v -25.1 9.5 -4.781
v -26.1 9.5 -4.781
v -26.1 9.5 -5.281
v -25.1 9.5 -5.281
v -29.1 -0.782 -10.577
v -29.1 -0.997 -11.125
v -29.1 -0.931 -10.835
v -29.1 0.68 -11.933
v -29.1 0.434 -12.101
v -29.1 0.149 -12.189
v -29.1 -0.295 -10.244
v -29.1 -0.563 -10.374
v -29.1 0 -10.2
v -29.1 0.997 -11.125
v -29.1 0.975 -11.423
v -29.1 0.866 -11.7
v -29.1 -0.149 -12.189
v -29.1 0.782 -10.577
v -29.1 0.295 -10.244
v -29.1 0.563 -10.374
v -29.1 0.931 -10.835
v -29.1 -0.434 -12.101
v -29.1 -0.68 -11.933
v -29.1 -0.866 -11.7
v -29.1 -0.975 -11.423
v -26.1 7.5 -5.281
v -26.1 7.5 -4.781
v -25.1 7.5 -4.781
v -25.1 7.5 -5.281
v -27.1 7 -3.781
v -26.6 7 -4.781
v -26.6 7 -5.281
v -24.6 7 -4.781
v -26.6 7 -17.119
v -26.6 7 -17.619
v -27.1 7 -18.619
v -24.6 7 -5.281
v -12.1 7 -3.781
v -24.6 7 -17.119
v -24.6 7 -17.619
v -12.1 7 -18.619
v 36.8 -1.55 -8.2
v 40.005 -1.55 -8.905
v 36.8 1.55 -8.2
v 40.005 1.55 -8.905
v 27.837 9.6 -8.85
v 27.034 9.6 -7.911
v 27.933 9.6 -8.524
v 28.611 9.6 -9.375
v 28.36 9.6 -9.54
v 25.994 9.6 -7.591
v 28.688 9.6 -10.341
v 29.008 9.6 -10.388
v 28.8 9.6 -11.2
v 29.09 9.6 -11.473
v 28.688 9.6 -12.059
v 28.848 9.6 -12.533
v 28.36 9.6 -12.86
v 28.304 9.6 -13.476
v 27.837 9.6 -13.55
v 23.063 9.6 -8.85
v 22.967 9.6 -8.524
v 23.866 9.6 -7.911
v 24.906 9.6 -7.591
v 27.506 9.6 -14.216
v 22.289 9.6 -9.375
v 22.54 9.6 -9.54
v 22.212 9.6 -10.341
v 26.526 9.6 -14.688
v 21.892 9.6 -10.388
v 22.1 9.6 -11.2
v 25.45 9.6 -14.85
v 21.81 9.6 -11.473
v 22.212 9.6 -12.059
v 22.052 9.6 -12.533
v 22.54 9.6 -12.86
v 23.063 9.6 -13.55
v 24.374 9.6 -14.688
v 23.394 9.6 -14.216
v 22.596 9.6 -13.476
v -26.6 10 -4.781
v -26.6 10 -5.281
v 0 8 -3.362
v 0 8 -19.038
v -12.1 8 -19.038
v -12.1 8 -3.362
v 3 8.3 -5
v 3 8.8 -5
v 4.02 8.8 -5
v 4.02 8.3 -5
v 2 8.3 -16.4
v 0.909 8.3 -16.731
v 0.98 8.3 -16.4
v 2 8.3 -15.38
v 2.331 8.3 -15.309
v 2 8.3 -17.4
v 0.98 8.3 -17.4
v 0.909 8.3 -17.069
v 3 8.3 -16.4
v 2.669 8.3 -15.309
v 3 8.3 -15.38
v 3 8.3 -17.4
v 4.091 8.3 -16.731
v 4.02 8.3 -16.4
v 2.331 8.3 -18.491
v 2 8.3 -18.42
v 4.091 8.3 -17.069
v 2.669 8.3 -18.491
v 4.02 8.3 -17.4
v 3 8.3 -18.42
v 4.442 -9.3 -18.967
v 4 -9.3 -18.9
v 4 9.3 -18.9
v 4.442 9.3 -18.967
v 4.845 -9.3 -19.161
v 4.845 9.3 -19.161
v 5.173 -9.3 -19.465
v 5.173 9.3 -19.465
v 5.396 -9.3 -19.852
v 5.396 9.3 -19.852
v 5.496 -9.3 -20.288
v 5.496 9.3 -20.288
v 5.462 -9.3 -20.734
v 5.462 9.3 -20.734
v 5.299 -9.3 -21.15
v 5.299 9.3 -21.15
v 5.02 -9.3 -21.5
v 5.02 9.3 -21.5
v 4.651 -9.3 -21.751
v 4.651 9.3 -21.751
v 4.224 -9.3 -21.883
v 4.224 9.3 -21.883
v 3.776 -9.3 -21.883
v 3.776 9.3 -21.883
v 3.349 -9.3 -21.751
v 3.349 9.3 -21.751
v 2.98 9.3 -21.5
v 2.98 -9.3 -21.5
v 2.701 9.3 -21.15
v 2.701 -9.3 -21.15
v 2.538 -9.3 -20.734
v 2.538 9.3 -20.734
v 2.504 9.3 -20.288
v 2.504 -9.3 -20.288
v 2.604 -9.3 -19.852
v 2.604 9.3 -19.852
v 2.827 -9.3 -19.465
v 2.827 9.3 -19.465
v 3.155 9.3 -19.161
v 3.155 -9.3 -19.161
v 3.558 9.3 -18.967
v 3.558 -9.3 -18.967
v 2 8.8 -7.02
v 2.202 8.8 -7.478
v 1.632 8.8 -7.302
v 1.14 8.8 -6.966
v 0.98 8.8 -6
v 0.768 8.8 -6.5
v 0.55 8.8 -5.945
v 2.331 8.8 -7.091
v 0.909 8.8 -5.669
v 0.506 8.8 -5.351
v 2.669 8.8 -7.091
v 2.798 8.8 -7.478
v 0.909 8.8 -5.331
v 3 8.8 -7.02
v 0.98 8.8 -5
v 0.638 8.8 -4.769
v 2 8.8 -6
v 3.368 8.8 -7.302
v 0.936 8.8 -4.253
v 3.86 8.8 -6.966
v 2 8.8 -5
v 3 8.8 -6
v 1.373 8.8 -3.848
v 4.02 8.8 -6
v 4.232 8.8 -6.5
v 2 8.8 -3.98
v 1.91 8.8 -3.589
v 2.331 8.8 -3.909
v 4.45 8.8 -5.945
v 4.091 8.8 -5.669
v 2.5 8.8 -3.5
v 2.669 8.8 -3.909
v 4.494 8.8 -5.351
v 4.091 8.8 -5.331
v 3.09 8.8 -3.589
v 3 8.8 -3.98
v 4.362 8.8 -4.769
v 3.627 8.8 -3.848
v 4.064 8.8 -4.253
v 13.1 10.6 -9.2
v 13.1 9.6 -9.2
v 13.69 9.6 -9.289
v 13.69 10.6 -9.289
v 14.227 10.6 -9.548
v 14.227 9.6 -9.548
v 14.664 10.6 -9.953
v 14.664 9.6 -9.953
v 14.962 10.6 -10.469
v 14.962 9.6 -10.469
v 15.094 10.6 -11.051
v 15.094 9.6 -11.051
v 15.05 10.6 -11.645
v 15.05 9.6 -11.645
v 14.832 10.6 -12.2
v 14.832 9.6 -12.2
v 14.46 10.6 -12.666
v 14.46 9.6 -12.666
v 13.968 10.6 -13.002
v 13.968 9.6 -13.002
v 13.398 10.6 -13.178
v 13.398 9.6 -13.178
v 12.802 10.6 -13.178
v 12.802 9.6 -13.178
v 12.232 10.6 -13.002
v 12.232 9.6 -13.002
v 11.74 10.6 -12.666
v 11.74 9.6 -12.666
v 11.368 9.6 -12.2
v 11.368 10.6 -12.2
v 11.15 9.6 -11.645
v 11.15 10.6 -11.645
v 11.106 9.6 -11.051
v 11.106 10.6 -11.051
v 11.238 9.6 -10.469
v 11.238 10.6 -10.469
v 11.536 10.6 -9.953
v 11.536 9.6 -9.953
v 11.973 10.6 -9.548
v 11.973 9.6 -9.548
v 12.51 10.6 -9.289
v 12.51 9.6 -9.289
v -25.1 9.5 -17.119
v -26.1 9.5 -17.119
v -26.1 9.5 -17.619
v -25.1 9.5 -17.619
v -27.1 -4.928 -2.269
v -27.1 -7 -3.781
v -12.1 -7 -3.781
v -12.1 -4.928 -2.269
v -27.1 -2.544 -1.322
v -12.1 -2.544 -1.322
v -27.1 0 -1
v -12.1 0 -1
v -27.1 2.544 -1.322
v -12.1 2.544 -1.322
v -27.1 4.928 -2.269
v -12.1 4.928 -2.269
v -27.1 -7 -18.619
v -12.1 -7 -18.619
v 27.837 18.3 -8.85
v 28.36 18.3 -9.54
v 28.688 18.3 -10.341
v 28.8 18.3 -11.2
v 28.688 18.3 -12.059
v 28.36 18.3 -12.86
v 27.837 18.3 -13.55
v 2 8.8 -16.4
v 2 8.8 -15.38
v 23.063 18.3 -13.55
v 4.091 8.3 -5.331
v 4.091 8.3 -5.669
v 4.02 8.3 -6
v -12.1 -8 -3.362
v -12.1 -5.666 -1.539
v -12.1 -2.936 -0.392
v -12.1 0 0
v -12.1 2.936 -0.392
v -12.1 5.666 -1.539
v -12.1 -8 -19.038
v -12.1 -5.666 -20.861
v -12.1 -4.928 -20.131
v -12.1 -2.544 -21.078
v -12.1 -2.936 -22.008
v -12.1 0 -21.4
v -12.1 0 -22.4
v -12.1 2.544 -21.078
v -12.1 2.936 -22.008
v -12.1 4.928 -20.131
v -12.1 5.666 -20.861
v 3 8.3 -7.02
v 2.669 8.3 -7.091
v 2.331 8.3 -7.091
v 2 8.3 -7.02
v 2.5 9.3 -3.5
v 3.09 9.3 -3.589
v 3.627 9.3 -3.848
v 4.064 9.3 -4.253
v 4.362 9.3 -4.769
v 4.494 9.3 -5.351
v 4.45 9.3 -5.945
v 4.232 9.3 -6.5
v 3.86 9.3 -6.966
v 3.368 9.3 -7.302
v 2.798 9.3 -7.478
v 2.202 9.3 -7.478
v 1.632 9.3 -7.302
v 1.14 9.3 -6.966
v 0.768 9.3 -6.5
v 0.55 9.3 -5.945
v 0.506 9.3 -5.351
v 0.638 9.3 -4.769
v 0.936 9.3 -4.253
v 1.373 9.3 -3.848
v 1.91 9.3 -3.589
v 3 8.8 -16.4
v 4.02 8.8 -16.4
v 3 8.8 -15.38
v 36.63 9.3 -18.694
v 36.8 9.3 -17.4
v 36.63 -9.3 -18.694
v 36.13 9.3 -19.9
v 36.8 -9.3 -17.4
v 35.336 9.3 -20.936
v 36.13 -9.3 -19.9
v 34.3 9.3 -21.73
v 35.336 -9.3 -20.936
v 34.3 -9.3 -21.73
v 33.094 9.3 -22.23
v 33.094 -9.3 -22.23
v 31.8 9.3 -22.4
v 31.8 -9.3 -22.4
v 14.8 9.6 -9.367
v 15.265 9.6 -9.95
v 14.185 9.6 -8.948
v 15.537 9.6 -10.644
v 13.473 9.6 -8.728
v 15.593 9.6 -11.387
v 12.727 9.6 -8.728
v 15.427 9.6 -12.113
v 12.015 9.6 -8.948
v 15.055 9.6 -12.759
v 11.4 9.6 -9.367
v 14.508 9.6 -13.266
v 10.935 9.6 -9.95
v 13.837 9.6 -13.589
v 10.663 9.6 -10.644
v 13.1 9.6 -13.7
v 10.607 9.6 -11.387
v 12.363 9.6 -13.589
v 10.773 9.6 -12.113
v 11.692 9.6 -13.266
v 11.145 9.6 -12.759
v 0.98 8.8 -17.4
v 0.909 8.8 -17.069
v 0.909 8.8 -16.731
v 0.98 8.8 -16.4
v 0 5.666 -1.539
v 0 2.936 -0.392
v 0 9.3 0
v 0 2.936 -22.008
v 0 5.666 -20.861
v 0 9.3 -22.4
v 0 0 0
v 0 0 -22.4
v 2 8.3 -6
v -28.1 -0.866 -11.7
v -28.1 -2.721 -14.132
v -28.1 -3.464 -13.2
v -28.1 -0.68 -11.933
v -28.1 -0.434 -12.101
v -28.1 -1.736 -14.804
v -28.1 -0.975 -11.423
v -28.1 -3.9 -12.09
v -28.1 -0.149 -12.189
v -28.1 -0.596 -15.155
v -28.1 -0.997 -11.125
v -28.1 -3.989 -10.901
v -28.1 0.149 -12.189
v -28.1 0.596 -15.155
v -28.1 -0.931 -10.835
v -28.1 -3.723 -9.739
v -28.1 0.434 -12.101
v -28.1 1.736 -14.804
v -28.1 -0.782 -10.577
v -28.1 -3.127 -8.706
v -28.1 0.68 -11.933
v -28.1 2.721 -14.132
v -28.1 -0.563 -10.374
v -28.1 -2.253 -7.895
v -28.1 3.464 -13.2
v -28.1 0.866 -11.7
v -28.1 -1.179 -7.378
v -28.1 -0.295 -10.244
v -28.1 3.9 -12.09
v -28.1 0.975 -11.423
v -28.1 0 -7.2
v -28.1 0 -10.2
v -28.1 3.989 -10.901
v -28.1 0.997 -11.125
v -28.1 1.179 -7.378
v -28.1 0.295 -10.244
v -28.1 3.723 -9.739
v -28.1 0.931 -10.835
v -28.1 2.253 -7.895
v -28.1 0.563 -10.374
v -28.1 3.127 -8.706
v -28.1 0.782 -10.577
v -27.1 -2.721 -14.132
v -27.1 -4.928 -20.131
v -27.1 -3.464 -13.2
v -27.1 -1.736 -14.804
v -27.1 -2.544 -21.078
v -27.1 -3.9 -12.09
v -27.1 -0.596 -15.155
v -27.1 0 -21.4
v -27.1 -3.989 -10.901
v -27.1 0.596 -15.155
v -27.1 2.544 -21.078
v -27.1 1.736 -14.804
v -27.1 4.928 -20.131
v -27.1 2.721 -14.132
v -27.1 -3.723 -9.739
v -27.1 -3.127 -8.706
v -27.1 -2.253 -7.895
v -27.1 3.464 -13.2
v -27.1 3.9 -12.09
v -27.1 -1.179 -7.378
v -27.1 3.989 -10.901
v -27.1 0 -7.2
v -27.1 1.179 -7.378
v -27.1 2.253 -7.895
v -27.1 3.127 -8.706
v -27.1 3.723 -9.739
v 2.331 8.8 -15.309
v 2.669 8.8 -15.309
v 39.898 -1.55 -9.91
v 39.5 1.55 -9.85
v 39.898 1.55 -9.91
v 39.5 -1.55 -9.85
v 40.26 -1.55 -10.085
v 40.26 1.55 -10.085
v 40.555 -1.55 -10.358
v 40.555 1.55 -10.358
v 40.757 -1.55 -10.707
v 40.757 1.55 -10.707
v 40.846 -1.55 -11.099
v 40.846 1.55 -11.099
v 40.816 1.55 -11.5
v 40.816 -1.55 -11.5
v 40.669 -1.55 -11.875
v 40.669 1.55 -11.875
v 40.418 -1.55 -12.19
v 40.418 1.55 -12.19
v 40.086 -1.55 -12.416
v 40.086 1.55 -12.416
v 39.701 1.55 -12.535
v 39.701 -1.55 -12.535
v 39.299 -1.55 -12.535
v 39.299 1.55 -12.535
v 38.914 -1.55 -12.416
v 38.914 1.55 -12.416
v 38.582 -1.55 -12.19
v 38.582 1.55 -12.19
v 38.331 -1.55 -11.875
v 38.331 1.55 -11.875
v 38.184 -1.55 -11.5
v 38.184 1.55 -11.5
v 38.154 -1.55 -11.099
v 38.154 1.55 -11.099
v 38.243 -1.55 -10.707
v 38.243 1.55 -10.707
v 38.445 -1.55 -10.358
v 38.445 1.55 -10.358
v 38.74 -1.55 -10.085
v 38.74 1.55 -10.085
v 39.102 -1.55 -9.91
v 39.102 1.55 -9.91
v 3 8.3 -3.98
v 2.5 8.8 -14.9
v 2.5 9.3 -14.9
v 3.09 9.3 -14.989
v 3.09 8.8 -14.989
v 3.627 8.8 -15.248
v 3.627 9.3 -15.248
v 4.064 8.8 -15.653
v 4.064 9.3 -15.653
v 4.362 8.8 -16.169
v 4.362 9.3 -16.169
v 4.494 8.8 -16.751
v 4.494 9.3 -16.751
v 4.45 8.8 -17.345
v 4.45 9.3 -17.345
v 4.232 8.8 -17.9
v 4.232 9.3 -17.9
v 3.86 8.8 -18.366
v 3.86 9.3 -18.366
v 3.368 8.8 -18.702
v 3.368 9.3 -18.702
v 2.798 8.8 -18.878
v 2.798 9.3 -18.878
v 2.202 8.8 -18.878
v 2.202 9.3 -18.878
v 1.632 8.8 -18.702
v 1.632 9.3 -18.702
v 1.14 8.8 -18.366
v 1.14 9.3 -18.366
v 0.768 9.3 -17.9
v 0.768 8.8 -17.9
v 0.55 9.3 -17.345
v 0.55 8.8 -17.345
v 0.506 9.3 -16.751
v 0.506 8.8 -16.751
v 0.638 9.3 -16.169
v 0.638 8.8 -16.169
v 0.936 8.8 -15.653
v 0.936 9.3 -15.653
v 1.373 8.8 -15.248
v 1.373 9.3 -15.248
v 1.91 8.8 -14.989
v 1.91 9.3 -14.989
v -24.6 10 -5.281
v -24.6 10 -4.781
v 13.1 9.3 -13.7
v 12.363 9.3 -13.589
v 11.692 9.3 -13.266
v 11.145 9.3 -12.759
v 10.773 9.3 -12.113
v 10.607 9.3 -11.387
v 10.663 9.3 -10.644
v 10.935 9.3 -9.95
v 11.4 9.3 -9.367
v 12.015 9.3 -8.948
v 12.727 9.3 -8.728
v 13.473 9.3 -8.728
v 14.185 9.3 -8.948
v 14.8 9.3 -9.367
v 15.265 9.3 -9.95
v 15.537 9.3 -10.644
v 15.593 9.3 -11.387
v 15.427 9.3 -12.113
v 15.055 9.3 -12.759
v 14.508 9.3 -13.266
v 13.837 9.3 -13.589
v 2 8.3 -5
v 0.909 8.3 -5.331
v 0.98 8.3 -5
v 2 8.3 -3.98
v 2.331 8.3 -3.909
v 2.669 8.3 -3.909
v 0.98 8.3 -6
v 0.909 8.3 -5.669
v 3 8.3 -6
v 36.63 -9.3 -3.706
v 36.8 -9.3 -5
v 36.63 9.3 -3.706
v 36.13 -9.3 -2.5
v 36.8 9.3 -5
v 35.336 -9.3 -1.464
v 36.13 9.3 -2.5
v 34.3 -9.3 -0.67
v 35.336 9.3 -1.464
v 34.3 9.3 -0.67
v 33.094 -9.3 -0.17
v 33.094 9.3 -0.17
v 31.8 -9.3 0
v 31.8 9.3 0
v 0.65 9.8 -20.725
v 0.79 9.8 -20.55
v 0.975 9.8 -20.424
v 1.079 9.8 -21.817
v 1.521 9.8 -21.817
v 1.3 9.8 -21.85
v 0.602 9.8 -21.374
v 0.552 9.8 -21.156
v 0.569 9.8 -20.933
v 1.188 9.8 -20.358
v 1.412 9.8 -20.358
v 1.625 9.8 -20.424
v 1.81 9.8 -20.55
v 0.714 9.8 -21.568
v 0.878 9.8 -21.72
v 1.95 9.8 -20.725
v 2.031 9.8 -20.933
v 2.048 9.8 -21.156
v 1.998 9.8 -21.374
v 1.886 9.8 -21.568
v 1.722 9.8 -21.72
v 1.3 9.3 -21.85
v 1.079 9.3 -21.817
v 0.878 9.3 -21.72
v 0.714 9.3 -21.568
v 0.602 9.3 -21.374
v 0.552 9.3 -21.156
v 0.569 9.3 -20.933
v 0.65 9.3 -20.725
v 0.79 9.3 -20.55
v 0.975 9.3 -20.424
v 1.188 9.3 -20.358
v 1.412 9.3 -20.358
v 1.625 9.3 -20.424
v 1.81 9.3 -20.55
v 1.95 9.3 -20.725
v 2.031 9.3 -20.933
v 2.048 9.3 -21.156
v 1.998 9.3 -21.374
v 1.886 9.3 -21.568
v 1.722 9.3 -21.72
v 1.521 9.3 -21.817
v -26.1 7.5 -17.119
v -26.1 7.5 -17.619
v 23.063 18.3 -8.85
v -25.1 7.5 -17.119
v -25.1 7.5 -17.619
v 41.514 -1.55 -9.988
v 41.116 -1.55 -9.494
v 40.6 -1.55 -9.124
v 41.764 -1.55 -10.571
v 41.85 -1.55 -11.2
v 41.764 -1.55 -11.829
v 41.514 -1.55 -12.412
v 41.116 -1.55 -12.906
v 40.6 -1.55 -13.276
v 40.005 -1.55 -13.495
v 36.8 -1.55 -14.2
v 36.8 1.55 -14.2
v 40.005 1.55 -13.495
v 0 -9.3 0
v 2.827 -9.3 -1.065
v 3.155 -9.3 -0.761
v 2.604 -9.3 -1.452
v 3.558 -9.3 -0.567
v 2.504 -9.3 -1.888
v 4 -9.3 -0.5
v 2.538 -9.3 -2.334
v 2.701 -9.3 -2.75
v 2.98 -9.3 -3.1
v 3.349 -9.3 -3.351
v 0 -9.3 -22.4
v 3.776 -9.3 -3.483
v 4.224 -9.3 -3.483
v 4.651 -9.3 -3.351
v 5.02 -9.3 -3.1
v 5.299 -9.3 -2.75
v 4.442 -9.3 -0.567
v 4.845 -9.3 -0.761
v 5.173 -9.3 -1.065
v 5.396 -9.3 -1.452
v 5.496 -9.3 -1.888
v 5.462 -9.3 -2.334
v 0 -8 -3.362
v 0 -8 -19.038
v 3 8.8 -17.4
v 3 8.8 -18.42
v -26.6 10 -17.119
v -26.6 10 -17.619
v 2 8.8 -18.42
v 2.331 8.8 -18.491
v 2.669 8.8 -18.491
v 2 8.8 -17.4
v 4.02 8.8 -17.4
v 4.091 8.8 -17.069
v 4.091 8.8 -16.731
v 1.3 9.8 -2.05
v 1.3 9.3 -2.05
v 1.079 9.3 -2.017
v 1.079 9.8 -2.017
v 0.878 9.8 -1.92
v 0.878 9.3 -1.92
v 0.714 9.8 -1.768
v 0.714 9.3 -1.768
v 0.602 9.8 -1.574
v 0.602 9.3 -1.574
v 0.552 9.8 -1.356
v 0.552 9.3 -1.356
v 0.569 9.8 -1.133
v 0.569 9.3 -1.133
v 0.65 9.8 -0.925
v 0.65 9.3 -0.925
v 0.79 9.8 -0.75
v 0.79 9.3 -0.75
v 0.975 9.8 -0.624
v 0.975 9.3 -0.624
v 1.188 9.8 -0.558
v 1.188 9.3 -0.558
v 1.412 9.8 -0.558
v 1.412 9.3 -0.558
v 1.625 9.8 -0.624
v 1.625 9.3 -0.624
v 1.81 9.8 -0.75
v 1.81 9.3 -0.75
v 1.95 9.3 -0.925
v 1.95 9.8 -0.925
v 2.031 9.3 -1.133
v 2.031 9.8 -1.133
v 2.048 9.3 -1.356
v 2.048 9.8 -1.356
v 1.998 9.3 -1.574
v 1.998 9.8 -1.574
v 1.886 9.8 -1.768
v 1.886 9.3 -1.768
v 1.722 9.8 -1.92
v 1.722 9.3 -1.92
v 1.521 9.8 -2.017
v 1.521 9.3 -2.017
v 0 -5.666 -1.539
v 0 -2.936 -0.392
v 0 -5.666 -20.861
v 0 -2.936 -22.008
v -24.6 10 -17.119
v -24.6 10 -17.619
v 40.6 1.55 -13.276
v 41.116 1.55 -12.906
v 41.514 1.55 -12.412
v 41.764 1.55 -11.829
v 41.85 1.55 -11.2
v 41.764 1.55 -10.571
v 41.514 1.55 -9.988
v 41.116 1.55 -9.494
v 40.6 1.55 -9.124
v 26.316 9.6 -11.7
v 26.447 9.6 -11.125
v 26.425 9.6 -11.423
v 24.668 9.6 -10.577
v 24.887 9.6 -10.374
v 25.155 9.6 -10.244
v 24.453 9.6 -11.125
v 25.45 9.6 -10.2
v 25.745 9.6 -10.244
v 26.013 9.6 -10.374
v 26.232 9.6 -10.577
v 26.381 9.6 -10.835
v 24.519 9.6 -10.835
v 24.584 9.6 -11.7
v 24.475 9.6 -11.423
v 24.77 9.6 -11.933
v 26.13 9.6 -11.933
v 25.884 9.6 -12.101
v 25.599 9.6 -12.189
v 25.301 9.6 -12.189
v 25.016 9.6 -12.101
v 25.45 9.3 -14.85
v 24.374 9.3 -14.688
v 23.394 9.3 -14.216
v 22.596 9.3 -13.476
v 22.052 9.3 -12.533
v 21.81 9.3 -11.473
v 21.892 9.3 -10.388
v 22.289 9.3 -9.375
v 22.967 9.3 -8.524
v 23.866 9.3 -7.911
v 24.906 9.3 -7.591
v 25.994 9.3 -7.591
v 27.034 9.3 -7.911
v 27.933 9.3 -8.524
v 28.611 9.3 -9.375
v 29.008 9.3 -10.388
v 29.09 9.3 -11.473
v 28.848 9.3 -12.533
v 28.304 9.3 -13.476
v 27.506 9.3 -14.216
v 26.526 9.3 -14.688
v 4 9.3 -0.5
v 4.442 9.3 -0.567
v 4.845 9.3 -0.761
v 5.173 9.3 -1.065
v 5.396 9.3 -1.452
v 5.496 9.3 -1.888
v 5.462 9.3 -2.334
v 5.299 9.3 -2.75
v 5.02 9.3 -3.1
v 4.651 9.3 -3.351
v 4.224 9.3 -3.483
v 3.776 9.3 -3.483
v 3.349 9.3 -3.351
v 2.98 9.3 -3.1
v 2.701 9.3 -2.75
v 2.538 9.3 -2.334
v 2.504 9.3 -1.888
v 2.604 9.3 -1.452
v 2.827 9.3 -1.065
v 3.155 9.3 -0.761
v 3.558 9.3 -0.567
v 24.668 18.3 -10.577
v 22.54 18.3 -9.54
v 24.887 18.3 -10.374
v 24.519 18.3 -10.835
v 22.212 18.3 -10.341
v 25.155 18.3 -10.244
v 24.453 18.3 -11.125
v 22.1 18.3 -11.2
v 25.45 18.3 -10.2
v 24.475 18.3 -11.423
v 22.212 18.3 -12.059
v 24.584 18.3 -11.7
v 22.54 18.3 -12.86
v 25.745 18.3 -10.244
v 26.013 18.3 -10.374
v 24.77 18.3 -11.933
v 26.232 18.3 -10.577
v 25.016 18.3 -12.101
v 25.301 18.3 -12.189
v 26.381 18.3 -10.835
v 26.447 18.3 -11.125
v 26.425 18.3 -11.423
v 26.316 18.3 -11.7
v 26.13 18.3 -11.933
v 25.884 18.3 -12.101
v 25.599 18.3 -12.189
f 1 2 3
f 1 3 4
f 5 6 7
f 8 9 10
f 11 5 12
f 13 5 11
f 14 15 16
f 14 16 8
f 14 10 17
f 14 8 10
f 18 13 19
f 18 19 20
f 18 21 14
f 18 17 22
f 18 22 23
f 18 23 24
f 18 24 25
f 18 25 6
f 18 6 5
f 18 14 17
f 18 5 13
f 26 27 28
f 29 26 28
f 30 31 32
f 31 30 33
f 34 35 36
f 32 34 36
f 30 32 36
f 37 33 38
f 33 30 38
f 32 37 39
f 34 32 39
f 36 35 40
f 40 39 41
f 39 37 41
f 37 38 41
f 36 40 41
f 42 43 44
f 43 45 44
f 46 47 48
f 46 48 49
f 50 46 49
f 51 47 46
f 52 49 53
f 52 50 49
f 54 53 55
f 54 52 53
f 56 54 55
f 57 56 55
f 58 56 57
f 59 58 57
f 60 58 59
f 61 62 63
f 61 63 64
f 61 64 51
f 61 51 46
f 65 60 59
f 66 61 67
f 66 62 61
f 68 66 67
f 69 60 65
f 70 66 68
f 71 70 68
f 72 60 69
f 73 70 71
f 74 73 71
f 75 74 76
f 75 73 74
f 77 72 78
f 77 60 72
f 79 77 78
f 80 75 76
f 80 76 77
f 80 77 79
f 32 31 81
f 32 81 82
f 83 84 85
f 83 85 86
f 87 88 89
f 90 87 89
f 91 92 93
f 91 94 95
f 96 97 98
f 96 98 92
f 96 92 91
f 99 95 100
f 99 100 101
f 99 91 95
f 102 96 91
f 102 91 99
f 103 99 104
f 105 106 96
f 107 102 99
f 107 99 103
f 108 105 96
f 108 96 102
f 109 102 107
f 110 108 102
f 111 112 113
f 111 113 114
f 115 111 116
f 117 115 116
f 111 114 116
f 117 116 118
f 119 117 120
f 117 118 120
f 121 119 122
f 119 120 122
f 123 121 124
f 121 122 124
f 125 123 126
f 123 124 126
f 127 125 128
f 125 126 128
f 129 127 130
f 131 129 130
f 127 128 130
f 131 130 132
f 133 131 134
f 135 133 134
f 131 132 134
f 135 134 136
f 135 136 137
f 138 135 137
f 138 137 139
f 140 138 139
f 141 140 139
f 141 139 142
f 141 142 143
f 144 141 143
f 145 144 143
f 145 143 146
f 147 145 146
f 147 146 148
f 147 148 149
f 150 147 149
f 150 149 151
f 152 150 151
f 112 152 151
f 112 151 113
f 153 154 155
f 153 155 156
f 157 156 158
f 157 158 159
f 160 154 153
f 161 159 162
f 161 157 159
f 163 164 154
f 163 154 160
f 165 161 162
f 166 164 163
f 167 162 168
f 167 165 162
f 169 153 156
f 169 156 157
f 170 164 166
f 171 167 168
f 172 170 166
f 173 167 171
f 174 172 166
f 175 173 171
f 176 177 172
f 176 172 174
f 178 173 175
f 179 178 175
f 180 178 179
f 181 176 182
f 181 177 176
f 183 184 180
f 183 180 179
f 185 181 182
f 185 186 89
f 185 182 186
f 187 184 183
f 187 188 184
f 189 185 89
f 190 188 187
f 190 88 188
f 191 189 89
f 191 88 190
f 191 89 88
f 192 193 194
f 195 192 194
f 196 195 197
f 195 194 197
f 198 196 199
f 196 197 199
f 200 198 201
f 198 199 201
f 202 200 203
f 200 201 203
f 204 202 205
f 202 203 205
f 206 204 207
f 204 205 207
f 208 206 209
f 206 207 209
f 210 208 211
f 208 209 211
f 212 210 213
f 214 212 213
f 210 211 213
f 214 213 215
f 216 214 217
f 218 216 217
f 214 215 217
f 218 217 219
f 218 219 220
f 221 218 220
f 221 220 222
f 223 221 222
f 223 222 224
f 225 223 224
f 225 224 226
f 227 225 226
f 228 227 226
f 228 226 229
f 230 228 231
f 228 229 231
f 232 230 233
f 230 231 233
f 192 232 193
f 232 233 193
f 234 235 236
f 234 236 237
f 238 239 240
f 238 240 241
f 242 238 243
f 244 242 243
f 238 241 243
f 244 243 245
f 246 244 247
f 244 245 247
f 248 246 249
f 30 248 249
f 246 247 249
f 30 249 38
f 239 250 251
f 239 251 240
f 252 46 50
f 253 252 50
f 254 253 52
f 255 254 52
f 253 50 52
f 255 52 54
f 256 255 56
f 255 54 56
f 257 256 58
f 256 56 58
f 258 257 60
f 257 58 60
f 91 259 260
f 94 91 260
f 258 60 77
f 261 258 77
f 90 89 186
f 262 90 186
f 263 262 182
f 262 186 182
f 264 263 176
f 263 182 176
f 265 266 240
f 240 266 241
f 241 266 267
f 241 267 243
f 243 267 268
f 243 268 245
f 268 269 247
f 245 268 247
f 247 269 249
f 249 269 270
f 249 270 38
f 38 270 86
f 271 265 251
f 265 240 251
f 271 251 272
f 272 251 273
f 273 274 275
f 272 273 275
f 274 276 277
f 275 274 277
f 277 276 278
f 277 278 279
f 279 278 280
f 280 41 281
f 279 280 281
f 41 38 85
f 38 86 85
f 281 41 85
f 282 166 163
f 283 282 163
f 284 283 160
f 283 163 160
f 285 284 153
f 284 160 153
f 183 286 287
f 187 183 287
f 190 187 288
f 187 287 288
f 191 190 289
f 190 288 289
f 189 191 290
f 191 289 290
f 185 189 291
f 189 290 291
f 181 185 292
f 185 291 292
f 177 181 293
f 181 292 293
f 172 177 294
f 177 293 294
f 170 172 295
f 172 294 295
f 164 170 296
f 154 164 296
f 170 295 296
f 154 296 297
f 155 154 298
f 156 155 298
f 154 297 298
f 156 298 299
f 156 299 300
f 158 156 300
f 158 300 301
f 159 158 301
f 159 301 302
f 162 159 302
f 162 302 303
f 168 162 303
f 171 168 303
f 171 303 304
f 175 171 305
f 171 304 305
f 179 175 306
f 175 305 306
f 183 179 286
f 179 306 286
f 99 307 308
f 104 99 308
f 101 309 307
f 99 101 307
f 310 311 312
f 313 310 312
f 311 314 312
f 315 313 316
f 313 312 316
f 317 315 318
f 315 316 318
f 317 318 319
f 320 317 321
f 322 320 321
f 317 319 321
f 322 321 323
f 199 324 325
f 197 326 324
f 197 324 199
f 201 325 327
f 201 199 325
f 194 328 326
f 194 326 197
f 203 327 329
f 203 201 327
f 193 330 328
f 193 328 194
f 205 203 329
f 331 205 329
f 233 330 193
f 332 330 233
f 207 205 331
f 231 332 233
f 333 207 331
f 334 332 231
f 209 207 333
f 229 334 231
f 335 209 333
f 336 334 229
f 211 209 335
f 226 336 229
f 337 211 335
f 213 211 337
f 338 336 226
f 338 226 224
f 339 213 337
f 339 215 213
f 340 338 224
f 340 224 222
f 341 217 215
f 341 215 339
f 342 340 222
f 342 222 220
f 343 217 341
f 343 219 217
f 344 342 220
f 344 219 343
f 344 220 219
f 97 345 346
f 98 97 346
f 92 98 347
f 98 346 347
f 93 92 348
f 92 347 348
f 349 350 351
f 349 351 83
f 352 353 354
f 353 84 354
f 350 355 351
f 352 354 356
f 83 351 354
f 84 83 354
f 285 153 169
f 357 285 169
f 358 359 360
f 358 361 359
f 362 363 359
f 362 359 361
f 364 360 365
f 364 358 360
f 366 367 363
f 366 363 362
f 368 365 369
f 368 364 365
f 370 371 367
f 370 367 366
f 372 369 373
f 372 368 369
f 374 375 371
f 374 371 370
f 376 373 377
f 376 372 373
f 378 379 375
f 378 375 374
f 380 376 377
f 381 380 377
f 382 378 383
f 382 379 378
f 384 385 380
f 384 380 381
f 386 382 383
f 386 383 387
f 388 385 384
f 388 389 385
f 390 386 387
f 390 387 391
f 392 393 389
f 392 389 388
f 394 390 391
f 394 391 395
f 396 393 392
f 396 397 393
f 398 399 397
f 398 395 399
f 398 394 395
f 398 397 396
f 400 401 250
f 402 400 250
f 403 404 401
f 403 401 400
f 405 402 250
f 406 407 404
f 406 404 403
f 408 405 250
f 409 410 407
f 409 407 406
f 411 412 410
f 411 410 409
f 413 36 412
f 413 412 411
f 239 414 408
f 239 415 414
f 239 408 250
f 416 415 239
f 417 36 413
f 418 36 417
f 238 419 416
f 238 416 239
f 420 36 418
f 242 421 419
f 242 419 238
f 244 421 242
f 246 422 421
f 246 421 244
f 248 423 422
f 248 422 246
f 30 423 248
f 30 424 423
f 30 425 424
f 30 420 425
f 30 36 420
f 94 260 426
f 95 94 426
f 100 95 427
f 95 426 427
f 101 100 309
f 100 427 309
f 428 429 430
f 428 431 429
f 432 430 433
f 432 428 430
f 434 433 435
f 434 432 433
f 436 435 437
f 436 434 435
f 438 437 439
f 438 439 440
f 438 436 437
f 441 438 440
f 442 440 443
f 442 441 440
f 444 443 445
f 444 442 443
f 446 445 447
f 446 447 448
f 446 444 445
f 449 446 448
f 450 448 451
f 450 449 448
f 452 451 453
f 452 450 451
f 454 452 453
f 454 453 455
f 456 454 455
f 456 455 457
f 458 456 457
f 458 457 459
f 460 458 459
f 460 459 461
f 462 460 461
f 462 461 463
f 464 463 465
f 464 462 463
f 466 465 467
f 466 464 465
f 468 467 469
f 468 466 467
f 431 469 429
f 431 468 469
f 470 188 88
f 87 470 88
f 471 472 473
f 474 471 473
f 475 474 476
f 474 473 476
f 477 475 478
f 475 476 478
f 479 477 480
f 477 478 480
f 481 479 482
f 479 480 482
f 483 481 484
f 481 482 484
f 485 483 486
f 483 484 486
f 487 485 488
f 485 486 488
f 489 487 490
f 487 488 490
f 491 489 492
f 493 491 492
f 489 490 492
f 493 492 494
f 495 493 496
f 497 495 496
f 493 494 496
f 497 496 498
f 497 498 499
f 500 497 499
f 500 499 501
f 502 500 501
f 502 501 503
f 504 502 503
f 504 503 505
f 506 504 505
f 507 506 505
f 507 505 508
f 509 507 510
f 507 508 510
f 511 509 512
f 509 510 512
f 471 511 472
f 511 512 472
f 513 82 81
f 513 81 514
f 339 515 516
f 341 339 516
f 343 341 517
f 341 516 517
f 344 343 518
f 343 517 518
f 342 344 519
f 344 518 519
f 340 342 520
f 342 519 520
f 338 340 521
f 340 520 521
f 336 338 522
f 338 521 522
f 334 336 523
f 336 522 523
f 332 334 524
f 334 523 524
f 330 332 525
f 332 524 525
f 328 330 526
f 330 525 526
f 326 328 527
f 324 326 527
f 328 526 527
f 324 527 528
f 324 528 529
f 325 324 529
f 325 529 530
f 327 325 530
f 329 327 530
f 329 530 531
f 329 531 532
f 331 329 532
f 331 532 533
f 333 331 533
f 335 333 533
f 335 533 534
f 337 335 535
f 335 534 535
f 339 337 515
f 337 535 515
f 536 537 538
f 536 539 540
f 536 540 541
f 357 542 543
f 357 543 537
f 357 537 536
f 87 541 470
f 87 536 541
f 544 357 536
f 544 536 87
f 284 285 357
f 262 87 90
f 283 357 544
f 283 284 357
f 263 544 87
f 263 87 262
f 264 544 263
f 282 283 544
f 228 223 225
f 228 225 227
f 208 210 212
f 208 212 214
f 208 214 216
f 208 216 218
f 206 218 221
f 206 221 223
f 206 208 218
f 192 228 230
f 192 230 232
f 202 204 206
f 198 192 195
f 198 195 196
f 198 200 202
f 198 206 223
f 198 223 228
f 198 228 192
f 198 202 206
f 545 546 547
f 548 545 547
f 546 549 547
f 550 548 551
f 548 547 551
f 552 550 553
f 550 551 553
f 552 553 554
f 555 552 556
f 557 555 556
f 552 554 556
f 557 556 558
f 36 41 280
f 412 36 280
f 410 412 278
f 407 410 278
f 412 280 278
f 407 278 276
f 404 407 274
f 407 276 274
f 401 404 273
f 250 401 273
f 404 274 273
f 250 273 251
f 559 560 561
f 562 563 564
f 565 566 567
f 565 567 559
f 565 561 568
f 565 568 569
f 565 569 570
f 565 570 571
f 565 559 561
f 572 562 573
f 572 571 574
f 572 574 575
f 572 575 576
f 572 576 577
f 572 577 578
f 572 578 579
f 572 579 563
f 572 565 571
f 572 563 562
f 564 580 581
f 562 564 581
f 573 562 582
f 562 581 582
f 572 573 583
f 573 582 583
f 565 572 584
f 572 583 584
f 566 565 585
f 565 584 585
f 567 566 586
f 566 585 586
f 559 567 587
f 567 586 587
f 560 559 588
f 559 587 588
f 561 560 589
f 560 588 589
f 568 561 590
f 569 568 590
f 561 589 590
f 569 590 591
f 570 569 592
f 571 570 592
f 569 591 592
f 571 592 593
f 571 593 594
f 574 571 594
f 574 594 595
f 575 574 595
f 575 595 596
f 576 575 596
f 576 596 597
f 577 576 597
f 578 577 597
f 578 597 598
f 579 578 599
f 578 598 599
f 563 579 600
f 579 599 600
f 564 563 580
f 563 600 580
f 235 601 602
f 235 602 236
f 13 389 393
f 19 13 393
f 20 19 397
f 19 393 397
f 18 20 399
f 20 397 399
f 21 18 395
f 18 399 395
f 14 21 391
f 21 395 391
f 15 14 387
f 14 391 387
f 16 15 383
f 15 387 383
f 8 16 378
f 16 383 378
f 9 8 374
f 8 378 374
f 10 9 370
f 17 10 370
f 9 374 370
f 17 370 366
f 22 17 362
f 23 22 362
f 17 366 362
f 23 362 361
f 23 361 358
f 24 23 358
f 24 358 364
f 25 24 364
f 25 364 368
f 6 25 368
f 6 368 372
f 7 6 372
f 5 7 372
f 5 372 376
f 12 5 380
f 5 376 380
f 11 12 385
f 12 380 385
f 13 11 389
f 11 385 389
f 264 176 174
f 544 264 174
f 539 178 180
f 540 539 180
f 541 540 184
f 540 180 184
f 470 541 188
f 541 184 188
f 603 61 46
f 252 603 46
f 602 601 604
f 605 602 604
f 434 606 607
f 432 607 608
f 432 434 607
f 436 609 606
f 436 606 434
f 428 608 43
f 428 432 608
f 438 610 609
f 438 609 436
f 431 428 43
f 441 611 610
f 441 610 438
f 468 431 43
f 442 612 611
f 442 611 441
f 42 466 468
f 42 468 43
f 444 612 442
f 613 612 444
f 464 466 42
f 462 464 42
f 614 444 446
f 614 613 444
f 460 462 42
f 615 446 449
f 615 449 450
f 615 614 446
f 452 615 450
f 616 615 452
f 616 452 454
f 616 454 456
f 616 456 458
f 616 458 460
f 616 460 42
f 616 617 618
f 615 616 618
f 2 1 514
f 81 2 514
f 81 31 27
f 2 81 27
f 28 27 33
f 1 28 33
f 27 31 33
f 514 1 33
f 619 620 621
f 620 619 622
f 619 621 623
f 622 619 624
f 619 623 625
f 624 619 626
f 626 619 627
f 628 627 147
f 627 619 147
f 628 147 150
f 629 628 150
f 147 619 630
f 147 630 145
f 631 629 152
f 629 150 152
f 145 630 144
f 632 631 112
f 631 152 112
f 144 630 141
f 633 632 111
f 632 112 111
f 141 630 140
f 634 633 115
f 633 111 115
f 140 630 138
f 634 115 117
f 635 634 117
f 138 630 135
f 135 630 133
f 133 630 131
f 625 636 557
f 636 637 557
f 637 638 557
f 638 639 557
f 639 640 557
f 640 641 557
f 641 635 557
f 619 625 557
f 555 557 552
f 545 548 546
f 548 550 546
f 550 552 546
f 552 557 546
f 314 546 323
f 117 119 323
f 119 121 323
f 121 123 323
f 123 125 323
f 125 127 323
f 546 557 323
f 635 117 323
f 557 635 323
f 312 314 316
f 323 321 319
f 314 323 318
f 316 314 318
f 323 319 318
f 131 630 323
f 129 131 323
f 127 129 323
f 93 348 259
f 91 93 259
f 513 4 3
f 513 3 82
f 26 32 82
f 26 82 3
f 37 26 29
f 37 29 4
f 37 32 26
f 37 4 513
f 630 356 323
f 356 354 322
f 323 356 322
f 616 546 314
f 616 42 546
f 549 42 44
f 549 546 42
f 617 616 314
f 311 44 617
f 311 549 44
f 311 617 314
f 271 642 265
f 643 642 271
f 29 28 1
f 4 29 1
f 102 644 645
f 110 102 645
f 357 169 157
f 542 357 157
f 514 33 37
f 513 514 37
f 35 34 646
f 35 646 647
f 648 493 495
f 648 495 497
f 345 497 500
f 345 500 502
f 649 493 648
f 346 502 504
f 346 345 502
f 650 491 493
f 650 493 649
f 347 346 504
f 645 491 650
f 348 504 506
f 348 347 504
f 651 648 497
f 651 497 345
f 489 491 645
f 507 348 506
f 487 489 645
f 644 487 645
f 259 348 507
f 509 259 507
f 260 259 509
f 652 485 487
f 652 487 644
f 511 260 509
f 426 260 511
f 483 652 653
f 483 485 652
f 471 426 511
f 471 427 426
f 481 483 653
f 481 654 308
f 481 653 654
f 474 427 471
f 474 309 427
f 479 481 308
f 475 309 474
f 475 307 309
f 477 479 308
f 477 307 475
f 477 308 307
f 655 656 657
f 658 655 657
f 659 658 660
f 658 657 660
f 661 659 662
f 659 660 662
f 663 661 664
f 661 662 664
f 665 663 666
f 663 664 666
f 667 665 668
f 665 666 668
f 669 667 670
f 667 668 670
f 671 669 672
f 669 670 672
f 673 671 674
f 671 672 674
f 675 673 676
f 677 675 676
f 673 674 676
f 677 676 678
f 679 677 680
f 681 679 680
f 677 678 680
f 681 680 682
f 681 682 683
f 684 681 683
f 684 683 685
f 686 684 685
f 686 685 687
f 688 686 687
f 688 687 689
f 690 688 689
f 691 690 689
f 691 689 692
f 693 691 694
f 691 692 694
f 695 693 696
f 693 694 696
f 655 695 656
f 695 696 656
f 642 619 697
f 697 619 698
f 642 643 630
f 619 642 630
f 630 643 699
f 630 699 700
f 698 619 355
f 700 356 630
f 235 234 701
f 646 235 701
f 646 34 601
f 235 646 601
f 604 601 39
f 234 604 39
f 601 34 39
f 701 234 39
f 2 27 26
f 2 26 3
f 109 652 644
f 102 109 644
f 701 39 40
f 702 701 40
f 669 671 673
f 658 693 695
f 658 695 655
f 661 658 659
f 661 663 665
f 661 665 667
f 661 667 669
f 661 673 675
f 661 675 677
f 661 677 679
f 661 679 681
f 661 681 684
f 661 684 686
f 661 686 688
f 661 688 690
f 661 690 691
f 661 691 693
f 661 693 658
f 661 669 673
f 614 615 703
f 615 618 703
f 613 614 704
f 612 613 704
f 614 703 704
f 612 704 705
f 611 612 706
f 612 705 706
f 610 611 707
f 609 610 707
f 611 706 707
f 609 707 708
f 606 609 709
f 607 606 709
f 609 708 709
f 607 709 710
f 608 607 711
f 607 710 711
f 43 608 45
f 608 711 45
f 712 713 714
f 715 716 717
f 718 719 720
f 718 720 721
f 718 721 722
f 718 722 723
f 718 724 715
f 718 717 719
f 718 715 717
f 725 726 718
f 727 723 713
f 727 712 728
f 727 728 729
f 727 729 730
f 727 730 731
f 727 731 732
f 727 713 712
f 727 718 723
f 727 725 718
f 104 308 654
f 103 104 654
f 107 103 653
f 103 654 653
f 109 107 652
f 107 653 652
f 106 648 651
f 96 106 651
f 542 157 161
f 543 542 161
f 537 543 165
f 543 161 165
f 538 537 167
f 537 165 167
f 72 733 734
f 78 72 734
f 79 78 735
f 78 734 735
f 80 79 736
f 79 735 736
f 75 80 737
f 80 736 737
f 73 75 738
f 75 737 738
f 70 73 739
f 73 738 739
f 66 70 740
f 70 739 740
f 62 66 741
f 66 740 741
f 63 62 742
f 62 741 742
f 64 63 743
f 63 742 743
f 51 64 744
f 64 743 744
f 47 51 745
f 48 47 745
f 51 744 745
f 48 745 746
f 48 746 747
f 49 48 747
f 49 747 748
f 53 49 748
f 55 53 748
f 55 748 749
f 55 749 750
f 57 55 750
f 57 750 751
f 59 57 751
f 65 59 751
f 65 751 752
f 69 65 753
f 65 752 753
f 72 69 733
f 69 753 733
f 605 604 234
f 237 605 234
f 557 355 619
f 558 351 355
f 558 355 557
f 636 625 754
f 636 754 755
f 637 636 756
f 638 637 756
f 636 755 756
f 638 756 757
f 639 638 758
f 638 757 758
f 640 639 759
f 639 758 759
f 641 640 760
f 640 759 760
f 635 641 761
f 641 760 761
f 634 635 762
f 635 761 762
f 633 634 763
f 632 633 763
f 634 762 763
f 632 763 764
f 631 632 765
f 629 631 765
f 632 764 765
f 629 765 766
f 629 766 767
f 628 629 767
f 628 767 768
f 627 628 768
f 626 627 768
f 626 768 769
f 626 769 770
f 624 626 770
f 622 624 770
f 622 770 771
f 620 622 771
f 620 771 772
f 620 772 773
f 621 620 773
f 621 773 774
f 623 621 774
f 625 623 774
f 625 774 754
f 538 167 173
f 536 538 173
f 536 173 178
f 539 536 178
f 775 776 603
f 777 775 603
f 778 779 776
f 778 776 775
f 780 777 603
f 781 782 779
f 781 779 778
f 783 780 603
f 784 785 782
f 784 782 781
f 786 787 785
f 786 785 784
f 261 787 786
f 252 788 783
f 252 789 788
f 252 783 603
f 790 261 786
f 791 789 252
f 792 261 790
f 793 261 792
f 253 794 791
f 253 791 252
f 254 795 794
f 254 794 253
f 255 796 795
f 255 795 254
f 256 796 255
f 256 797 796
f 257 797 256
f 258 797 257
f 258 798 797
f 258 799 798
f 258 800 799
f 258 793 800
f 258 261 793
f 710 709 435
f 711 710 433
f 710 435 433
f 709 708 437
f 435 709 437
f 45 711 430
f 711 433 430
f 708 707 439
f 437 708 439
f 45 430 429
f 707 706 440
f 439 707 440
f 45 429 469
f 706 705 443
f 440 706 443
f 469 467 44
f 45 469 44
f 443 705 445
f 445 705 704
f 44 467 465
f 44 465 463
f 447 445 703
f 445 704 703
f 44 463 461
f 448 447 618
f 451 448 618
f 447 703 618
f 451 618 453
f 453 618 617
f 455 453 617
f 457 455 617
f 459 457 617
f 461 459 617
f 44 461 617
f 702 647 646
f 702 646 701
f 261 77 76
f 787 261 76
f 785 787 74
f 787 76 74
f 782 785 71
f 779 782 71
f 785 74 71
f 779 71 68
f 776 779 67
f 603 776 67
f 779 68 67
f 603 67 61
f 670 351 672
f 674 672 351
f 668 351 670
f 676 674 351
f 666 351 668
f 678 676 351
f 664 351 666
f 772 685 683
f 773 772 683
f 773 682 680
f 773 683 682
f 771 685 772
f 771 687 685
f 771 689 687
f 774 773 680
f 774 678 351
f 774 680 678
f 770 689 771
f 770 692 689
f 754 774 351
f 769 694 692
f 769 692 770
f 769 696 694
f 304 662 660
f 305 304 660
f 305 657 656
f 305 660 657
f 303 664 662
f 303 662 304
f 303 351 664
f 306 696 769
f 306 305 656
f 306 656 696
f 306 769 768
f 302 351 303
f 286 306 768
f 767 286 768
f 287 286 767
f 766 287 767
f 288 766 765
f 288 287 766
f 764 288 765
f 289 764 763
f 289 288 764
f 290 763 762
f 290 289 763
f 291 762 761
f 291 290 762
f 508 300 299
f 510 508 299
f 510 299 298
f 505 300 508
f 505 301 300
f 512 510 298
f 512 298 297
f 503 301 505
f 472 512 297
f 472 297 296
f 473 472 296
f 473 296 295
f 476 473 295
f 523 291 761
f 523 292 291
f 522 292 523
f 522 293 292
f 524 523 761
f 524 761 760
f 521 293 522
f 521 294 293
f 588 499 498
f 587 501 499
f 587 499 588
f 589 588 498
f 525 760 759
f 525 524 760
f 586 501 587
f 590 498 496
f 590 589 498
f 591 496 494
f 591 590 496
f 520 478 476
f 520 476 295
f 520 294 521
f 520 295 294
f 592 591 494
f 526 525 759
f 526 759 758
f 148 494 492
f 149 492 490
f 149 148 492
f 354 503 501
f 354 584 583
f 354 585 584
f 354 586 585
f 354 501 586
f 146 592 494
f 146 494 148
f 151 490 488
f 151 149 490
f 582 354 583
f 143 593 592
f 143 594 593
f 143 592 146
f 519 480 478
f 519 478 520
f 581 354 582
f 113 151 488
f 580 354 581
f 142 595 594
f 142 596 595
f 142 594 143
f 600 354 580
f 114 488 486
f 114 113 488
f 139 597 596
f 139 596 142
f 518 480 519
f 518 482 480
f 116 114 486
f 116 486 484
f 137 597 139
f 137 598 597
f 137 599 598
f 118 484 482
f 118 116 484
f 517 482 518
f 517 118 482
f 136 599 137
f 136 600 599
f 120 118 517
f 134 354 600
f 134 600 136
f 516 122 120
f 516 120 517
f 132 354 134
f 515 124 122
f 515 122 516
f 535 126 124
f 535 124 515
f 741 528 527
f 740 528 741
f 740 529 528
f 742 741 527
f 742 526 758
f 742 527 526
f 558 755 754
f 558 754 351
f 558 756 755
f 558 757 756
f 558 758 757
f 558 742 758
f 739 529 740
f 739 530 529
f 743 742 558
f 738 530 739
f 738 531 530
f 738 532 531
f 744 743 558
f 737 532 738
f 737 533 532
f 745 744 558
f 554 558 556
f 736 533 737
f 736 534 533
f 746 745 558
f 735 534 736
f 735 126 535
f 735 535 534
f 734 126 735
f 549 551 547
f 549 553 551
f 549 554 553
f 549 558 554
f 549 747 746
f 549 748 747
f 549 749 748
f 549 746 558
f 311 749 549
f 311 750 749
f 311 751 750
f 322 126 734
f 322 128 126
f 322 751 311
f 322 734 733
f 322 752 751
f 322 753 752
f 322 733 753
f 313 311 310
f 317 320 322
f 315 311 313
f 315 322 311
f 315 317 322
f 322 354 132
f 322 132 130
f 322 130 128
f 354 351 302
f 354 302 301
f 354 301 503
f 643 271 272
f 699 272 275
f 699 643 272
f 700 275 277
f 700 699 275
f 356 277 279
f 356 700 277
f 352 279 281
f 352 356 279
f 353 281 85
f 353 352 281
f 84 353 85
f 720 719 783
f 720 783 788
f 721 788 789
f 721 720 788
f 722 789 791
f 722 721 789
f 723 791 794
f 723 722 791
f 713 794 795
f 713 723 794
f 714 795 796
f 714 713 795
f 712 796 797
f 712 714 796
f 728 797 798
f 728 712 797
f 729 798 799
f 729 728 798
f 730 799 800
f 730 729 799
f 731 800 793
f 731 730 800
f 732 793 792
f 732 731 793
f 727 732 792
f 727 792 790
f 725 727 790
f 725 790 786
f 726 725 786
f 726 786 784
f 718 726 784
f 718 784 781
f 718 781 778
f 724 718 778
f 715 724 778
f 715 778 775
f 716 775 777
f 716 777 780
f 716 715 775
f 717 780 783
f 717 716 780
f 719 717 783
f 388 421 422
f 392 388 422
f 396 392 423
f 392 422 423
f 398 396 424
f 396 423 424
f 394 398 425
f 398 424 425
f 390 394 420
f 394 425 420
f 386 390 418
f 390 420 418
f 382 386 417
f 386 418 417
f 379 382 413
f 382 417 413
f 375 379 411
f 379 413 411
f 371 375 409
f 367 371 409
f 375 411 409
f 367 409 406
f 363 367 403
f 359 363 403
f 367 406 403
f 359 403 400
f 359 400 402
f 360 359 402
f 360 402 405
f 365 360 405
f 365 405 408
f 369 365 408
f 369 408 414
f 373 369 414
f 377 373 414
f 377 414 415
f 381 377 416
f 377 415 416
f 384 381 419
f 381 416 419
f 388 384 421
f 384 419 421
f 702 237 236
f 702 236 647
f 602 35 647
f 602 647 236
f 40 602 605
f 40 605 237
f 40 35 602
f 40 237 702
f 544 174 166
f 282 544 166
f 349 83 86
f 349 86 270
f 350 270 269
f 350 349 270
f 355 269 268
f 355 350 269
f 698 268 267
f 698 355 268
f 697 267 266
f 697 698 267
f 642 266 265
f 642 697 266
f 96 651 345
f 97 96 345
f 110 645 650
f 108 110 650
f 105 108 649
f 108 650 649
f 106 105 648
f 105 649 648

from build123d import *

# Parameters (mm, degrees)
SKETCH1_W       = 36.8
SKETCH1_H       = 22.4
EXTRUDE1_DEPTH  = 9.3
FILLET1_R       = 5
SKETCH2_R       = 1.35
EXTRUDE2_DEPTH  = 1.55
SKETCH3_R       = 3.65
SKETCH3_R_2     = 2.5
EXTRUDE3_DEPTH  = 0.3
SKETCH4_R       = 1
EXTRUDE4_DEPTH  = 8.7
SKETCH6_R       = 2
EXTRUDE5_DEPTH  = 1
SKETCH7_R       = 1.5
EXTRUDE6_DEPTH  = 19.6
SKETCH8_R       = 2
EXTRUDE7_DEPTH  = 0.5
EXTRUDE8_DEPTH  = 0.5
SKETCH10_R      = 0.75
EXTRUDE9_DEPTH  = 0.5
EXTRUDE11_DEPTH = 12.1
EXTRUDE12_DEPTH = 15
SKETCH14_R      = 4
EXTRUDE13_DEPTH = 1
SKETCH15_R      = 1
EXTRUDE14_DEPTH = 1
SKETCH16_W      = 2
SKETCH16_H      = 0.5
EXTRUDE15_DEPTH = 3
SKETCH17_W      = 1
SKETCH17_H      = 2
EXTRUDE16_DEPTH = 18.618894796


with BuildPart() as part:
    # Sketch1 → Extrude1 (new body, symmetric)
    with BuildSketch(Plane(origin=(0, 0, 0), x_dir=(1, 0, 0), z_dir=(0, 1, 0))):
        with Locations((18.4, 11.2)):
            Rectangle(SKETCH1_W, SKETCH1_H)
    extrude(amount=EXTRUDE1_DEPTH, both=True)

    # Fillet1
    fillet1_edges = [part.edges().sort_by_distance(p)[0] for p in [
        (36.8, 0, -22.4),
        (36.8, 0, 0),
    ]]
    fillet(fillet1_edges, radius=FILLET1_R)

    # Sketch2 → Extrude2 (add, symmetric)
    with BuildSketch(Plane(origin=(0, 0, 0), x_dir=(1, 0, 0), z_dir=(0, 1, 0))):
        with BuildLine():
            Line((36.8, 14.2), (40.004789912, 13.495144254))
            ThreePointArc((40.004789912, 13.495144254), (41.85, 11.2), (40.004789912, 8.904855746))
            Line((40.004789912, 8.904855746), (36.8, 8.2))
            Line((36.8, 8.2), (36.8, 14.2))
        make_face()
        with Locations(Location((39.5, 11.2, 0), (0, 0, 270))):  # turned: the seam where the file's is
            Circle(SKETCH2_R, mode=Mode.SUBTRACT)
    extrude(amount=EXTRUDE2_DEPTH, both=True)

    # Sketch3 → Extrude3 (add)
    with BuildSketch(Plane(origin=(0, 9.3, 0), x_dir=(1, 0, 0), z_dir=(0, 1, 0))):
        with Locations(Location((25.45, 11.2, 0), (0, 0, 90))):  # turned: the seam where the file's is
            Circle(SKETCH3_R)
        with Locations(Location((13.1, 11.2, 0), (0, 0, 90))):  # turned: the seam where the file's is
            Circle(SKETCH3_R_2)
    extrude(amount=EXTRUDE3_DEPTH)

    # Sketch4 → Extrude4 (add)
    with BuildSketch(Plane(origin=(0, 9.6, 0), x_dir=(1, 0, 0), z_dir=(0, 1, 0))):
        with BuildLine():
            Line((23.062532723, 8.85), (27.837467277, 8.85))
            ThreePointArc((27.837467277, 8.85), (28.8, 11.2), (27.837467277, 13.55))
            Line((27.837467277, 13.55), (23.062532723, 13.55))
            ThreePointArc((23.062532723, 13.55), (22.1, 11.2), (23.062532723, 8.85))
        make_face()
        with Locations(Location((25.45, 11.2, 0), (0, 0, 270))):  # turned: the seam where the file's is
            Circle(SKETCH4_R, mode=Mode.SUBTRACT)
    extrude(amount=EXTRUDE4_DEPTH)

    # Sketch6 → Extrude5 (add)
    with BuildSketch(Plane(origin=(0, 9.6, 0), x_dir=(1, 0, 0), z_dir=(0, 1, 0))):
        with Locations(Location((13.1, 11.2, 0), (0, 0, 270))):  # turned: the seam where the file's is
            Circle(SKETCH6_R)
    extrude(amount=EXTRUDE5_DEPTH)

    # Sketch7 → Extrude6 (cut, through all)
    with BuildSketch(Plane(origin=(0, 9.3, 0), x_dir=(1, 0, 0), z_dir=(0, 1, 0))):
        with Locations(Location((4, 20.4, 0), (0, 0, 270))):  # turned: the seam where the file's is
            Circle(SKETCH7_R)
        with Locations(Location((4, 2, 0), (0, 0, 270))):  # turned: the seam where the file's is
            Circle(SKETCH7_R)
    extrude(amount=-EXTRUDE6_DEPTH, mode=Mode.SUBTRACT)

    # Sketch8 → Extrude7 (cut)
    with BuildSketch(Plane(origin=(0, 9.3, 0), x_dir=(1, 0, 0), z_dir=(0, 1, 0))):
        with Locations(Location((2.5, 16.9, 0), (0, 0, 270))):  # turned: the seam where the file's is
            Circle(SKETCH8_R)
        with Locations(Location((2.5, 5.5, 0), (0, 0, 270))):  # turned: the seam where the file's is
            Circle(SKETCH8_R)
    extrude(amount=-EXTRUDE7_DEPTH, mode=Mode.SUBTRACT)

    # Sketch9 → Extrude8 (cut)
    with BuildSketch(Plane(origin=(0, 8.8, 0), x_dir=(1, 0, 0), z_dir=(0, 1, 0))):
        with BuildLine():
            Line((2, 7.019868415), (2, 6))
            Line((2, 6), (0.980131585, 6))
            ThreePointArc((0.980131585, 6), (0.9, 5.5), (0.980131585, 5))
            Line((0.980131585, 5), (2, 5))
            Line((2, 5), (2, 3.980131585))
            ThreePointArc((2, 3.980131585), (2.5, 3.9), (3, 3.980131585))
            Line((3, 3.980131585), (3, 5))
            Line((3, 5), (4.019868415, 5))
            ThreePointArc((4.019868415, 5), (4.1, 5.5), (4.019868415, 6))
            Line((4.019868415, 6), (3, 6))
            Line((3, 6), (3, 7.019868415))
            ThreePointArc((3, 7.019868415), (2.5, 7.1), (2, 7.019868415))
        make_face()
        with BuildLine():
            Line((4.019868415, 17.4), (3, 17.4))
            Line((3, 17.4), (3, 18.419868415))
            ThreePointArc((3, 18.419868415), (2.5, 18.5), (2, 18.419868415))
            Line((2, 18.419868415), (2, 17.4))
            Line((2, 17.4), (0.980131585, 17.4))
            ThreePointArc((0.980131585, 17.4), (0.9, 16.9), (0.980131585, 16.4))
            Line((0.980131585, 16.4), (2, 16.4))
            Line((2, 16.4), (2, 15.380131585))
            ThreePointArc((2, 15.380131585), (2.5, 15.3), (3, 15.380131585))
            Line((3, 15.380131585), (3, 16.4))
            Line((3, 16.4), (4.019868415, 16.4))
            ThreePointArc((4.019868415, 16.4), (4.1, 16.9), (4.019868415, 17.4))
        make_face()
    extrude(amount=-EXTRUDE8_DEPTH, mode=Mode.SUBTRACT)

    # Sketch10 → Extrude9 (add)
    with BuildSketch(Plane(origin=(0, 9.3, 0), x_dir=(1, 0, 0), z_dir=(0, 1, 0))):
        with Locations(Location((1.3, 21.1, 0), (0, 0, 90))):  # turned: the seam where the file's is
            Circle(SKETCH10_R)
        with Locations(Location((1.3, 1.3, 0), (0, 0, 90))):  # turned: the seam where the file's is
            Circle(SKETCH10_R)
    extrude(amount=EXTRUDE9_DEPTH)

    # Sketch12 → Extrude11 (add)
    with BuildSketch(Plane.ZY):
        with BuildLine():
            Line((-19.038367177, 8), (-3.361632823, 8))
            ThreePointArc((-3.361632823, 8), (0, 0), (-3.361632823, -8))
            Line((-3.361632823, -8), (-19.038367177, -8))
            ThreePointArc((-19.038367177, -8), (-22.4, 0), (-19.038367177, 8))
        make_face()
    extrude(amount=EXTRUDE11_DEPTH)

    # Sketch13 → Extrude12 (add)
    with BuildSketch(Plane.ZY.offset(12.1)):
        with BuildLine():
            Line((-18.618894796, -7), (-3.781105204, -7))
            ThreePointArc((-3.781105204, -7), (-1, 0), (-3.781105204, 7))
            Line((-3.781105204, 7), (-18.618894796, 7))
            ThreePointArc((-18.618894796, 7), (-21.4, 0), (-18.618894796, -7))
        make_face()
    extrude(amount=EXTRUDE12_DEPTH)

    # Sketch14 → Extrude13 (add)
    with BuildSketch(Plane.ZY.offset(27.1)):
        with Locations((-11.2, 0)):
            Circle(SKETCH14_R)
    extrude(amount=EXTRUDE13_DEPTH)

    # Sketch15 → Extrude14 (add)
    with BuildSketch(Plane.ZY.offset(28.1)):
        with Locations((-11.2, 0)):
            Circle(SKETCH15_R)
    extrude(amount=EXTRUDE14_DEPTH)

    # Sketch16 → Extrude15 (add)
    with BuildSketch(Plane(origin=(0, 7, 0), x_dir=(1, 0, 0), z_dir=(0, 1, 0))):
        with Locations((-25.6, 17.368894796)):
            Rectangle(SKETCH16_W, SKETCH16_H)
        with Locations((-25.6, 5.031105204)):
            Rectangle(SKETCH16_W, SKETCH16_H)
    extrude(amount=EXTRUDE15_DEPTH)

    # Sketch17 → Extrude16 (cut, through all)
    with BuildSketch(Plane.XY.offset(-4.781105204)):
        with Locations((-25.6, 8.5)):
            Rectangle(SKETCH17_W, SKETCH17_H)
    extrude(amount=-EXTRUDE16_DEPTH, mode=Mode.SUBTRACT)


solid = part.part
